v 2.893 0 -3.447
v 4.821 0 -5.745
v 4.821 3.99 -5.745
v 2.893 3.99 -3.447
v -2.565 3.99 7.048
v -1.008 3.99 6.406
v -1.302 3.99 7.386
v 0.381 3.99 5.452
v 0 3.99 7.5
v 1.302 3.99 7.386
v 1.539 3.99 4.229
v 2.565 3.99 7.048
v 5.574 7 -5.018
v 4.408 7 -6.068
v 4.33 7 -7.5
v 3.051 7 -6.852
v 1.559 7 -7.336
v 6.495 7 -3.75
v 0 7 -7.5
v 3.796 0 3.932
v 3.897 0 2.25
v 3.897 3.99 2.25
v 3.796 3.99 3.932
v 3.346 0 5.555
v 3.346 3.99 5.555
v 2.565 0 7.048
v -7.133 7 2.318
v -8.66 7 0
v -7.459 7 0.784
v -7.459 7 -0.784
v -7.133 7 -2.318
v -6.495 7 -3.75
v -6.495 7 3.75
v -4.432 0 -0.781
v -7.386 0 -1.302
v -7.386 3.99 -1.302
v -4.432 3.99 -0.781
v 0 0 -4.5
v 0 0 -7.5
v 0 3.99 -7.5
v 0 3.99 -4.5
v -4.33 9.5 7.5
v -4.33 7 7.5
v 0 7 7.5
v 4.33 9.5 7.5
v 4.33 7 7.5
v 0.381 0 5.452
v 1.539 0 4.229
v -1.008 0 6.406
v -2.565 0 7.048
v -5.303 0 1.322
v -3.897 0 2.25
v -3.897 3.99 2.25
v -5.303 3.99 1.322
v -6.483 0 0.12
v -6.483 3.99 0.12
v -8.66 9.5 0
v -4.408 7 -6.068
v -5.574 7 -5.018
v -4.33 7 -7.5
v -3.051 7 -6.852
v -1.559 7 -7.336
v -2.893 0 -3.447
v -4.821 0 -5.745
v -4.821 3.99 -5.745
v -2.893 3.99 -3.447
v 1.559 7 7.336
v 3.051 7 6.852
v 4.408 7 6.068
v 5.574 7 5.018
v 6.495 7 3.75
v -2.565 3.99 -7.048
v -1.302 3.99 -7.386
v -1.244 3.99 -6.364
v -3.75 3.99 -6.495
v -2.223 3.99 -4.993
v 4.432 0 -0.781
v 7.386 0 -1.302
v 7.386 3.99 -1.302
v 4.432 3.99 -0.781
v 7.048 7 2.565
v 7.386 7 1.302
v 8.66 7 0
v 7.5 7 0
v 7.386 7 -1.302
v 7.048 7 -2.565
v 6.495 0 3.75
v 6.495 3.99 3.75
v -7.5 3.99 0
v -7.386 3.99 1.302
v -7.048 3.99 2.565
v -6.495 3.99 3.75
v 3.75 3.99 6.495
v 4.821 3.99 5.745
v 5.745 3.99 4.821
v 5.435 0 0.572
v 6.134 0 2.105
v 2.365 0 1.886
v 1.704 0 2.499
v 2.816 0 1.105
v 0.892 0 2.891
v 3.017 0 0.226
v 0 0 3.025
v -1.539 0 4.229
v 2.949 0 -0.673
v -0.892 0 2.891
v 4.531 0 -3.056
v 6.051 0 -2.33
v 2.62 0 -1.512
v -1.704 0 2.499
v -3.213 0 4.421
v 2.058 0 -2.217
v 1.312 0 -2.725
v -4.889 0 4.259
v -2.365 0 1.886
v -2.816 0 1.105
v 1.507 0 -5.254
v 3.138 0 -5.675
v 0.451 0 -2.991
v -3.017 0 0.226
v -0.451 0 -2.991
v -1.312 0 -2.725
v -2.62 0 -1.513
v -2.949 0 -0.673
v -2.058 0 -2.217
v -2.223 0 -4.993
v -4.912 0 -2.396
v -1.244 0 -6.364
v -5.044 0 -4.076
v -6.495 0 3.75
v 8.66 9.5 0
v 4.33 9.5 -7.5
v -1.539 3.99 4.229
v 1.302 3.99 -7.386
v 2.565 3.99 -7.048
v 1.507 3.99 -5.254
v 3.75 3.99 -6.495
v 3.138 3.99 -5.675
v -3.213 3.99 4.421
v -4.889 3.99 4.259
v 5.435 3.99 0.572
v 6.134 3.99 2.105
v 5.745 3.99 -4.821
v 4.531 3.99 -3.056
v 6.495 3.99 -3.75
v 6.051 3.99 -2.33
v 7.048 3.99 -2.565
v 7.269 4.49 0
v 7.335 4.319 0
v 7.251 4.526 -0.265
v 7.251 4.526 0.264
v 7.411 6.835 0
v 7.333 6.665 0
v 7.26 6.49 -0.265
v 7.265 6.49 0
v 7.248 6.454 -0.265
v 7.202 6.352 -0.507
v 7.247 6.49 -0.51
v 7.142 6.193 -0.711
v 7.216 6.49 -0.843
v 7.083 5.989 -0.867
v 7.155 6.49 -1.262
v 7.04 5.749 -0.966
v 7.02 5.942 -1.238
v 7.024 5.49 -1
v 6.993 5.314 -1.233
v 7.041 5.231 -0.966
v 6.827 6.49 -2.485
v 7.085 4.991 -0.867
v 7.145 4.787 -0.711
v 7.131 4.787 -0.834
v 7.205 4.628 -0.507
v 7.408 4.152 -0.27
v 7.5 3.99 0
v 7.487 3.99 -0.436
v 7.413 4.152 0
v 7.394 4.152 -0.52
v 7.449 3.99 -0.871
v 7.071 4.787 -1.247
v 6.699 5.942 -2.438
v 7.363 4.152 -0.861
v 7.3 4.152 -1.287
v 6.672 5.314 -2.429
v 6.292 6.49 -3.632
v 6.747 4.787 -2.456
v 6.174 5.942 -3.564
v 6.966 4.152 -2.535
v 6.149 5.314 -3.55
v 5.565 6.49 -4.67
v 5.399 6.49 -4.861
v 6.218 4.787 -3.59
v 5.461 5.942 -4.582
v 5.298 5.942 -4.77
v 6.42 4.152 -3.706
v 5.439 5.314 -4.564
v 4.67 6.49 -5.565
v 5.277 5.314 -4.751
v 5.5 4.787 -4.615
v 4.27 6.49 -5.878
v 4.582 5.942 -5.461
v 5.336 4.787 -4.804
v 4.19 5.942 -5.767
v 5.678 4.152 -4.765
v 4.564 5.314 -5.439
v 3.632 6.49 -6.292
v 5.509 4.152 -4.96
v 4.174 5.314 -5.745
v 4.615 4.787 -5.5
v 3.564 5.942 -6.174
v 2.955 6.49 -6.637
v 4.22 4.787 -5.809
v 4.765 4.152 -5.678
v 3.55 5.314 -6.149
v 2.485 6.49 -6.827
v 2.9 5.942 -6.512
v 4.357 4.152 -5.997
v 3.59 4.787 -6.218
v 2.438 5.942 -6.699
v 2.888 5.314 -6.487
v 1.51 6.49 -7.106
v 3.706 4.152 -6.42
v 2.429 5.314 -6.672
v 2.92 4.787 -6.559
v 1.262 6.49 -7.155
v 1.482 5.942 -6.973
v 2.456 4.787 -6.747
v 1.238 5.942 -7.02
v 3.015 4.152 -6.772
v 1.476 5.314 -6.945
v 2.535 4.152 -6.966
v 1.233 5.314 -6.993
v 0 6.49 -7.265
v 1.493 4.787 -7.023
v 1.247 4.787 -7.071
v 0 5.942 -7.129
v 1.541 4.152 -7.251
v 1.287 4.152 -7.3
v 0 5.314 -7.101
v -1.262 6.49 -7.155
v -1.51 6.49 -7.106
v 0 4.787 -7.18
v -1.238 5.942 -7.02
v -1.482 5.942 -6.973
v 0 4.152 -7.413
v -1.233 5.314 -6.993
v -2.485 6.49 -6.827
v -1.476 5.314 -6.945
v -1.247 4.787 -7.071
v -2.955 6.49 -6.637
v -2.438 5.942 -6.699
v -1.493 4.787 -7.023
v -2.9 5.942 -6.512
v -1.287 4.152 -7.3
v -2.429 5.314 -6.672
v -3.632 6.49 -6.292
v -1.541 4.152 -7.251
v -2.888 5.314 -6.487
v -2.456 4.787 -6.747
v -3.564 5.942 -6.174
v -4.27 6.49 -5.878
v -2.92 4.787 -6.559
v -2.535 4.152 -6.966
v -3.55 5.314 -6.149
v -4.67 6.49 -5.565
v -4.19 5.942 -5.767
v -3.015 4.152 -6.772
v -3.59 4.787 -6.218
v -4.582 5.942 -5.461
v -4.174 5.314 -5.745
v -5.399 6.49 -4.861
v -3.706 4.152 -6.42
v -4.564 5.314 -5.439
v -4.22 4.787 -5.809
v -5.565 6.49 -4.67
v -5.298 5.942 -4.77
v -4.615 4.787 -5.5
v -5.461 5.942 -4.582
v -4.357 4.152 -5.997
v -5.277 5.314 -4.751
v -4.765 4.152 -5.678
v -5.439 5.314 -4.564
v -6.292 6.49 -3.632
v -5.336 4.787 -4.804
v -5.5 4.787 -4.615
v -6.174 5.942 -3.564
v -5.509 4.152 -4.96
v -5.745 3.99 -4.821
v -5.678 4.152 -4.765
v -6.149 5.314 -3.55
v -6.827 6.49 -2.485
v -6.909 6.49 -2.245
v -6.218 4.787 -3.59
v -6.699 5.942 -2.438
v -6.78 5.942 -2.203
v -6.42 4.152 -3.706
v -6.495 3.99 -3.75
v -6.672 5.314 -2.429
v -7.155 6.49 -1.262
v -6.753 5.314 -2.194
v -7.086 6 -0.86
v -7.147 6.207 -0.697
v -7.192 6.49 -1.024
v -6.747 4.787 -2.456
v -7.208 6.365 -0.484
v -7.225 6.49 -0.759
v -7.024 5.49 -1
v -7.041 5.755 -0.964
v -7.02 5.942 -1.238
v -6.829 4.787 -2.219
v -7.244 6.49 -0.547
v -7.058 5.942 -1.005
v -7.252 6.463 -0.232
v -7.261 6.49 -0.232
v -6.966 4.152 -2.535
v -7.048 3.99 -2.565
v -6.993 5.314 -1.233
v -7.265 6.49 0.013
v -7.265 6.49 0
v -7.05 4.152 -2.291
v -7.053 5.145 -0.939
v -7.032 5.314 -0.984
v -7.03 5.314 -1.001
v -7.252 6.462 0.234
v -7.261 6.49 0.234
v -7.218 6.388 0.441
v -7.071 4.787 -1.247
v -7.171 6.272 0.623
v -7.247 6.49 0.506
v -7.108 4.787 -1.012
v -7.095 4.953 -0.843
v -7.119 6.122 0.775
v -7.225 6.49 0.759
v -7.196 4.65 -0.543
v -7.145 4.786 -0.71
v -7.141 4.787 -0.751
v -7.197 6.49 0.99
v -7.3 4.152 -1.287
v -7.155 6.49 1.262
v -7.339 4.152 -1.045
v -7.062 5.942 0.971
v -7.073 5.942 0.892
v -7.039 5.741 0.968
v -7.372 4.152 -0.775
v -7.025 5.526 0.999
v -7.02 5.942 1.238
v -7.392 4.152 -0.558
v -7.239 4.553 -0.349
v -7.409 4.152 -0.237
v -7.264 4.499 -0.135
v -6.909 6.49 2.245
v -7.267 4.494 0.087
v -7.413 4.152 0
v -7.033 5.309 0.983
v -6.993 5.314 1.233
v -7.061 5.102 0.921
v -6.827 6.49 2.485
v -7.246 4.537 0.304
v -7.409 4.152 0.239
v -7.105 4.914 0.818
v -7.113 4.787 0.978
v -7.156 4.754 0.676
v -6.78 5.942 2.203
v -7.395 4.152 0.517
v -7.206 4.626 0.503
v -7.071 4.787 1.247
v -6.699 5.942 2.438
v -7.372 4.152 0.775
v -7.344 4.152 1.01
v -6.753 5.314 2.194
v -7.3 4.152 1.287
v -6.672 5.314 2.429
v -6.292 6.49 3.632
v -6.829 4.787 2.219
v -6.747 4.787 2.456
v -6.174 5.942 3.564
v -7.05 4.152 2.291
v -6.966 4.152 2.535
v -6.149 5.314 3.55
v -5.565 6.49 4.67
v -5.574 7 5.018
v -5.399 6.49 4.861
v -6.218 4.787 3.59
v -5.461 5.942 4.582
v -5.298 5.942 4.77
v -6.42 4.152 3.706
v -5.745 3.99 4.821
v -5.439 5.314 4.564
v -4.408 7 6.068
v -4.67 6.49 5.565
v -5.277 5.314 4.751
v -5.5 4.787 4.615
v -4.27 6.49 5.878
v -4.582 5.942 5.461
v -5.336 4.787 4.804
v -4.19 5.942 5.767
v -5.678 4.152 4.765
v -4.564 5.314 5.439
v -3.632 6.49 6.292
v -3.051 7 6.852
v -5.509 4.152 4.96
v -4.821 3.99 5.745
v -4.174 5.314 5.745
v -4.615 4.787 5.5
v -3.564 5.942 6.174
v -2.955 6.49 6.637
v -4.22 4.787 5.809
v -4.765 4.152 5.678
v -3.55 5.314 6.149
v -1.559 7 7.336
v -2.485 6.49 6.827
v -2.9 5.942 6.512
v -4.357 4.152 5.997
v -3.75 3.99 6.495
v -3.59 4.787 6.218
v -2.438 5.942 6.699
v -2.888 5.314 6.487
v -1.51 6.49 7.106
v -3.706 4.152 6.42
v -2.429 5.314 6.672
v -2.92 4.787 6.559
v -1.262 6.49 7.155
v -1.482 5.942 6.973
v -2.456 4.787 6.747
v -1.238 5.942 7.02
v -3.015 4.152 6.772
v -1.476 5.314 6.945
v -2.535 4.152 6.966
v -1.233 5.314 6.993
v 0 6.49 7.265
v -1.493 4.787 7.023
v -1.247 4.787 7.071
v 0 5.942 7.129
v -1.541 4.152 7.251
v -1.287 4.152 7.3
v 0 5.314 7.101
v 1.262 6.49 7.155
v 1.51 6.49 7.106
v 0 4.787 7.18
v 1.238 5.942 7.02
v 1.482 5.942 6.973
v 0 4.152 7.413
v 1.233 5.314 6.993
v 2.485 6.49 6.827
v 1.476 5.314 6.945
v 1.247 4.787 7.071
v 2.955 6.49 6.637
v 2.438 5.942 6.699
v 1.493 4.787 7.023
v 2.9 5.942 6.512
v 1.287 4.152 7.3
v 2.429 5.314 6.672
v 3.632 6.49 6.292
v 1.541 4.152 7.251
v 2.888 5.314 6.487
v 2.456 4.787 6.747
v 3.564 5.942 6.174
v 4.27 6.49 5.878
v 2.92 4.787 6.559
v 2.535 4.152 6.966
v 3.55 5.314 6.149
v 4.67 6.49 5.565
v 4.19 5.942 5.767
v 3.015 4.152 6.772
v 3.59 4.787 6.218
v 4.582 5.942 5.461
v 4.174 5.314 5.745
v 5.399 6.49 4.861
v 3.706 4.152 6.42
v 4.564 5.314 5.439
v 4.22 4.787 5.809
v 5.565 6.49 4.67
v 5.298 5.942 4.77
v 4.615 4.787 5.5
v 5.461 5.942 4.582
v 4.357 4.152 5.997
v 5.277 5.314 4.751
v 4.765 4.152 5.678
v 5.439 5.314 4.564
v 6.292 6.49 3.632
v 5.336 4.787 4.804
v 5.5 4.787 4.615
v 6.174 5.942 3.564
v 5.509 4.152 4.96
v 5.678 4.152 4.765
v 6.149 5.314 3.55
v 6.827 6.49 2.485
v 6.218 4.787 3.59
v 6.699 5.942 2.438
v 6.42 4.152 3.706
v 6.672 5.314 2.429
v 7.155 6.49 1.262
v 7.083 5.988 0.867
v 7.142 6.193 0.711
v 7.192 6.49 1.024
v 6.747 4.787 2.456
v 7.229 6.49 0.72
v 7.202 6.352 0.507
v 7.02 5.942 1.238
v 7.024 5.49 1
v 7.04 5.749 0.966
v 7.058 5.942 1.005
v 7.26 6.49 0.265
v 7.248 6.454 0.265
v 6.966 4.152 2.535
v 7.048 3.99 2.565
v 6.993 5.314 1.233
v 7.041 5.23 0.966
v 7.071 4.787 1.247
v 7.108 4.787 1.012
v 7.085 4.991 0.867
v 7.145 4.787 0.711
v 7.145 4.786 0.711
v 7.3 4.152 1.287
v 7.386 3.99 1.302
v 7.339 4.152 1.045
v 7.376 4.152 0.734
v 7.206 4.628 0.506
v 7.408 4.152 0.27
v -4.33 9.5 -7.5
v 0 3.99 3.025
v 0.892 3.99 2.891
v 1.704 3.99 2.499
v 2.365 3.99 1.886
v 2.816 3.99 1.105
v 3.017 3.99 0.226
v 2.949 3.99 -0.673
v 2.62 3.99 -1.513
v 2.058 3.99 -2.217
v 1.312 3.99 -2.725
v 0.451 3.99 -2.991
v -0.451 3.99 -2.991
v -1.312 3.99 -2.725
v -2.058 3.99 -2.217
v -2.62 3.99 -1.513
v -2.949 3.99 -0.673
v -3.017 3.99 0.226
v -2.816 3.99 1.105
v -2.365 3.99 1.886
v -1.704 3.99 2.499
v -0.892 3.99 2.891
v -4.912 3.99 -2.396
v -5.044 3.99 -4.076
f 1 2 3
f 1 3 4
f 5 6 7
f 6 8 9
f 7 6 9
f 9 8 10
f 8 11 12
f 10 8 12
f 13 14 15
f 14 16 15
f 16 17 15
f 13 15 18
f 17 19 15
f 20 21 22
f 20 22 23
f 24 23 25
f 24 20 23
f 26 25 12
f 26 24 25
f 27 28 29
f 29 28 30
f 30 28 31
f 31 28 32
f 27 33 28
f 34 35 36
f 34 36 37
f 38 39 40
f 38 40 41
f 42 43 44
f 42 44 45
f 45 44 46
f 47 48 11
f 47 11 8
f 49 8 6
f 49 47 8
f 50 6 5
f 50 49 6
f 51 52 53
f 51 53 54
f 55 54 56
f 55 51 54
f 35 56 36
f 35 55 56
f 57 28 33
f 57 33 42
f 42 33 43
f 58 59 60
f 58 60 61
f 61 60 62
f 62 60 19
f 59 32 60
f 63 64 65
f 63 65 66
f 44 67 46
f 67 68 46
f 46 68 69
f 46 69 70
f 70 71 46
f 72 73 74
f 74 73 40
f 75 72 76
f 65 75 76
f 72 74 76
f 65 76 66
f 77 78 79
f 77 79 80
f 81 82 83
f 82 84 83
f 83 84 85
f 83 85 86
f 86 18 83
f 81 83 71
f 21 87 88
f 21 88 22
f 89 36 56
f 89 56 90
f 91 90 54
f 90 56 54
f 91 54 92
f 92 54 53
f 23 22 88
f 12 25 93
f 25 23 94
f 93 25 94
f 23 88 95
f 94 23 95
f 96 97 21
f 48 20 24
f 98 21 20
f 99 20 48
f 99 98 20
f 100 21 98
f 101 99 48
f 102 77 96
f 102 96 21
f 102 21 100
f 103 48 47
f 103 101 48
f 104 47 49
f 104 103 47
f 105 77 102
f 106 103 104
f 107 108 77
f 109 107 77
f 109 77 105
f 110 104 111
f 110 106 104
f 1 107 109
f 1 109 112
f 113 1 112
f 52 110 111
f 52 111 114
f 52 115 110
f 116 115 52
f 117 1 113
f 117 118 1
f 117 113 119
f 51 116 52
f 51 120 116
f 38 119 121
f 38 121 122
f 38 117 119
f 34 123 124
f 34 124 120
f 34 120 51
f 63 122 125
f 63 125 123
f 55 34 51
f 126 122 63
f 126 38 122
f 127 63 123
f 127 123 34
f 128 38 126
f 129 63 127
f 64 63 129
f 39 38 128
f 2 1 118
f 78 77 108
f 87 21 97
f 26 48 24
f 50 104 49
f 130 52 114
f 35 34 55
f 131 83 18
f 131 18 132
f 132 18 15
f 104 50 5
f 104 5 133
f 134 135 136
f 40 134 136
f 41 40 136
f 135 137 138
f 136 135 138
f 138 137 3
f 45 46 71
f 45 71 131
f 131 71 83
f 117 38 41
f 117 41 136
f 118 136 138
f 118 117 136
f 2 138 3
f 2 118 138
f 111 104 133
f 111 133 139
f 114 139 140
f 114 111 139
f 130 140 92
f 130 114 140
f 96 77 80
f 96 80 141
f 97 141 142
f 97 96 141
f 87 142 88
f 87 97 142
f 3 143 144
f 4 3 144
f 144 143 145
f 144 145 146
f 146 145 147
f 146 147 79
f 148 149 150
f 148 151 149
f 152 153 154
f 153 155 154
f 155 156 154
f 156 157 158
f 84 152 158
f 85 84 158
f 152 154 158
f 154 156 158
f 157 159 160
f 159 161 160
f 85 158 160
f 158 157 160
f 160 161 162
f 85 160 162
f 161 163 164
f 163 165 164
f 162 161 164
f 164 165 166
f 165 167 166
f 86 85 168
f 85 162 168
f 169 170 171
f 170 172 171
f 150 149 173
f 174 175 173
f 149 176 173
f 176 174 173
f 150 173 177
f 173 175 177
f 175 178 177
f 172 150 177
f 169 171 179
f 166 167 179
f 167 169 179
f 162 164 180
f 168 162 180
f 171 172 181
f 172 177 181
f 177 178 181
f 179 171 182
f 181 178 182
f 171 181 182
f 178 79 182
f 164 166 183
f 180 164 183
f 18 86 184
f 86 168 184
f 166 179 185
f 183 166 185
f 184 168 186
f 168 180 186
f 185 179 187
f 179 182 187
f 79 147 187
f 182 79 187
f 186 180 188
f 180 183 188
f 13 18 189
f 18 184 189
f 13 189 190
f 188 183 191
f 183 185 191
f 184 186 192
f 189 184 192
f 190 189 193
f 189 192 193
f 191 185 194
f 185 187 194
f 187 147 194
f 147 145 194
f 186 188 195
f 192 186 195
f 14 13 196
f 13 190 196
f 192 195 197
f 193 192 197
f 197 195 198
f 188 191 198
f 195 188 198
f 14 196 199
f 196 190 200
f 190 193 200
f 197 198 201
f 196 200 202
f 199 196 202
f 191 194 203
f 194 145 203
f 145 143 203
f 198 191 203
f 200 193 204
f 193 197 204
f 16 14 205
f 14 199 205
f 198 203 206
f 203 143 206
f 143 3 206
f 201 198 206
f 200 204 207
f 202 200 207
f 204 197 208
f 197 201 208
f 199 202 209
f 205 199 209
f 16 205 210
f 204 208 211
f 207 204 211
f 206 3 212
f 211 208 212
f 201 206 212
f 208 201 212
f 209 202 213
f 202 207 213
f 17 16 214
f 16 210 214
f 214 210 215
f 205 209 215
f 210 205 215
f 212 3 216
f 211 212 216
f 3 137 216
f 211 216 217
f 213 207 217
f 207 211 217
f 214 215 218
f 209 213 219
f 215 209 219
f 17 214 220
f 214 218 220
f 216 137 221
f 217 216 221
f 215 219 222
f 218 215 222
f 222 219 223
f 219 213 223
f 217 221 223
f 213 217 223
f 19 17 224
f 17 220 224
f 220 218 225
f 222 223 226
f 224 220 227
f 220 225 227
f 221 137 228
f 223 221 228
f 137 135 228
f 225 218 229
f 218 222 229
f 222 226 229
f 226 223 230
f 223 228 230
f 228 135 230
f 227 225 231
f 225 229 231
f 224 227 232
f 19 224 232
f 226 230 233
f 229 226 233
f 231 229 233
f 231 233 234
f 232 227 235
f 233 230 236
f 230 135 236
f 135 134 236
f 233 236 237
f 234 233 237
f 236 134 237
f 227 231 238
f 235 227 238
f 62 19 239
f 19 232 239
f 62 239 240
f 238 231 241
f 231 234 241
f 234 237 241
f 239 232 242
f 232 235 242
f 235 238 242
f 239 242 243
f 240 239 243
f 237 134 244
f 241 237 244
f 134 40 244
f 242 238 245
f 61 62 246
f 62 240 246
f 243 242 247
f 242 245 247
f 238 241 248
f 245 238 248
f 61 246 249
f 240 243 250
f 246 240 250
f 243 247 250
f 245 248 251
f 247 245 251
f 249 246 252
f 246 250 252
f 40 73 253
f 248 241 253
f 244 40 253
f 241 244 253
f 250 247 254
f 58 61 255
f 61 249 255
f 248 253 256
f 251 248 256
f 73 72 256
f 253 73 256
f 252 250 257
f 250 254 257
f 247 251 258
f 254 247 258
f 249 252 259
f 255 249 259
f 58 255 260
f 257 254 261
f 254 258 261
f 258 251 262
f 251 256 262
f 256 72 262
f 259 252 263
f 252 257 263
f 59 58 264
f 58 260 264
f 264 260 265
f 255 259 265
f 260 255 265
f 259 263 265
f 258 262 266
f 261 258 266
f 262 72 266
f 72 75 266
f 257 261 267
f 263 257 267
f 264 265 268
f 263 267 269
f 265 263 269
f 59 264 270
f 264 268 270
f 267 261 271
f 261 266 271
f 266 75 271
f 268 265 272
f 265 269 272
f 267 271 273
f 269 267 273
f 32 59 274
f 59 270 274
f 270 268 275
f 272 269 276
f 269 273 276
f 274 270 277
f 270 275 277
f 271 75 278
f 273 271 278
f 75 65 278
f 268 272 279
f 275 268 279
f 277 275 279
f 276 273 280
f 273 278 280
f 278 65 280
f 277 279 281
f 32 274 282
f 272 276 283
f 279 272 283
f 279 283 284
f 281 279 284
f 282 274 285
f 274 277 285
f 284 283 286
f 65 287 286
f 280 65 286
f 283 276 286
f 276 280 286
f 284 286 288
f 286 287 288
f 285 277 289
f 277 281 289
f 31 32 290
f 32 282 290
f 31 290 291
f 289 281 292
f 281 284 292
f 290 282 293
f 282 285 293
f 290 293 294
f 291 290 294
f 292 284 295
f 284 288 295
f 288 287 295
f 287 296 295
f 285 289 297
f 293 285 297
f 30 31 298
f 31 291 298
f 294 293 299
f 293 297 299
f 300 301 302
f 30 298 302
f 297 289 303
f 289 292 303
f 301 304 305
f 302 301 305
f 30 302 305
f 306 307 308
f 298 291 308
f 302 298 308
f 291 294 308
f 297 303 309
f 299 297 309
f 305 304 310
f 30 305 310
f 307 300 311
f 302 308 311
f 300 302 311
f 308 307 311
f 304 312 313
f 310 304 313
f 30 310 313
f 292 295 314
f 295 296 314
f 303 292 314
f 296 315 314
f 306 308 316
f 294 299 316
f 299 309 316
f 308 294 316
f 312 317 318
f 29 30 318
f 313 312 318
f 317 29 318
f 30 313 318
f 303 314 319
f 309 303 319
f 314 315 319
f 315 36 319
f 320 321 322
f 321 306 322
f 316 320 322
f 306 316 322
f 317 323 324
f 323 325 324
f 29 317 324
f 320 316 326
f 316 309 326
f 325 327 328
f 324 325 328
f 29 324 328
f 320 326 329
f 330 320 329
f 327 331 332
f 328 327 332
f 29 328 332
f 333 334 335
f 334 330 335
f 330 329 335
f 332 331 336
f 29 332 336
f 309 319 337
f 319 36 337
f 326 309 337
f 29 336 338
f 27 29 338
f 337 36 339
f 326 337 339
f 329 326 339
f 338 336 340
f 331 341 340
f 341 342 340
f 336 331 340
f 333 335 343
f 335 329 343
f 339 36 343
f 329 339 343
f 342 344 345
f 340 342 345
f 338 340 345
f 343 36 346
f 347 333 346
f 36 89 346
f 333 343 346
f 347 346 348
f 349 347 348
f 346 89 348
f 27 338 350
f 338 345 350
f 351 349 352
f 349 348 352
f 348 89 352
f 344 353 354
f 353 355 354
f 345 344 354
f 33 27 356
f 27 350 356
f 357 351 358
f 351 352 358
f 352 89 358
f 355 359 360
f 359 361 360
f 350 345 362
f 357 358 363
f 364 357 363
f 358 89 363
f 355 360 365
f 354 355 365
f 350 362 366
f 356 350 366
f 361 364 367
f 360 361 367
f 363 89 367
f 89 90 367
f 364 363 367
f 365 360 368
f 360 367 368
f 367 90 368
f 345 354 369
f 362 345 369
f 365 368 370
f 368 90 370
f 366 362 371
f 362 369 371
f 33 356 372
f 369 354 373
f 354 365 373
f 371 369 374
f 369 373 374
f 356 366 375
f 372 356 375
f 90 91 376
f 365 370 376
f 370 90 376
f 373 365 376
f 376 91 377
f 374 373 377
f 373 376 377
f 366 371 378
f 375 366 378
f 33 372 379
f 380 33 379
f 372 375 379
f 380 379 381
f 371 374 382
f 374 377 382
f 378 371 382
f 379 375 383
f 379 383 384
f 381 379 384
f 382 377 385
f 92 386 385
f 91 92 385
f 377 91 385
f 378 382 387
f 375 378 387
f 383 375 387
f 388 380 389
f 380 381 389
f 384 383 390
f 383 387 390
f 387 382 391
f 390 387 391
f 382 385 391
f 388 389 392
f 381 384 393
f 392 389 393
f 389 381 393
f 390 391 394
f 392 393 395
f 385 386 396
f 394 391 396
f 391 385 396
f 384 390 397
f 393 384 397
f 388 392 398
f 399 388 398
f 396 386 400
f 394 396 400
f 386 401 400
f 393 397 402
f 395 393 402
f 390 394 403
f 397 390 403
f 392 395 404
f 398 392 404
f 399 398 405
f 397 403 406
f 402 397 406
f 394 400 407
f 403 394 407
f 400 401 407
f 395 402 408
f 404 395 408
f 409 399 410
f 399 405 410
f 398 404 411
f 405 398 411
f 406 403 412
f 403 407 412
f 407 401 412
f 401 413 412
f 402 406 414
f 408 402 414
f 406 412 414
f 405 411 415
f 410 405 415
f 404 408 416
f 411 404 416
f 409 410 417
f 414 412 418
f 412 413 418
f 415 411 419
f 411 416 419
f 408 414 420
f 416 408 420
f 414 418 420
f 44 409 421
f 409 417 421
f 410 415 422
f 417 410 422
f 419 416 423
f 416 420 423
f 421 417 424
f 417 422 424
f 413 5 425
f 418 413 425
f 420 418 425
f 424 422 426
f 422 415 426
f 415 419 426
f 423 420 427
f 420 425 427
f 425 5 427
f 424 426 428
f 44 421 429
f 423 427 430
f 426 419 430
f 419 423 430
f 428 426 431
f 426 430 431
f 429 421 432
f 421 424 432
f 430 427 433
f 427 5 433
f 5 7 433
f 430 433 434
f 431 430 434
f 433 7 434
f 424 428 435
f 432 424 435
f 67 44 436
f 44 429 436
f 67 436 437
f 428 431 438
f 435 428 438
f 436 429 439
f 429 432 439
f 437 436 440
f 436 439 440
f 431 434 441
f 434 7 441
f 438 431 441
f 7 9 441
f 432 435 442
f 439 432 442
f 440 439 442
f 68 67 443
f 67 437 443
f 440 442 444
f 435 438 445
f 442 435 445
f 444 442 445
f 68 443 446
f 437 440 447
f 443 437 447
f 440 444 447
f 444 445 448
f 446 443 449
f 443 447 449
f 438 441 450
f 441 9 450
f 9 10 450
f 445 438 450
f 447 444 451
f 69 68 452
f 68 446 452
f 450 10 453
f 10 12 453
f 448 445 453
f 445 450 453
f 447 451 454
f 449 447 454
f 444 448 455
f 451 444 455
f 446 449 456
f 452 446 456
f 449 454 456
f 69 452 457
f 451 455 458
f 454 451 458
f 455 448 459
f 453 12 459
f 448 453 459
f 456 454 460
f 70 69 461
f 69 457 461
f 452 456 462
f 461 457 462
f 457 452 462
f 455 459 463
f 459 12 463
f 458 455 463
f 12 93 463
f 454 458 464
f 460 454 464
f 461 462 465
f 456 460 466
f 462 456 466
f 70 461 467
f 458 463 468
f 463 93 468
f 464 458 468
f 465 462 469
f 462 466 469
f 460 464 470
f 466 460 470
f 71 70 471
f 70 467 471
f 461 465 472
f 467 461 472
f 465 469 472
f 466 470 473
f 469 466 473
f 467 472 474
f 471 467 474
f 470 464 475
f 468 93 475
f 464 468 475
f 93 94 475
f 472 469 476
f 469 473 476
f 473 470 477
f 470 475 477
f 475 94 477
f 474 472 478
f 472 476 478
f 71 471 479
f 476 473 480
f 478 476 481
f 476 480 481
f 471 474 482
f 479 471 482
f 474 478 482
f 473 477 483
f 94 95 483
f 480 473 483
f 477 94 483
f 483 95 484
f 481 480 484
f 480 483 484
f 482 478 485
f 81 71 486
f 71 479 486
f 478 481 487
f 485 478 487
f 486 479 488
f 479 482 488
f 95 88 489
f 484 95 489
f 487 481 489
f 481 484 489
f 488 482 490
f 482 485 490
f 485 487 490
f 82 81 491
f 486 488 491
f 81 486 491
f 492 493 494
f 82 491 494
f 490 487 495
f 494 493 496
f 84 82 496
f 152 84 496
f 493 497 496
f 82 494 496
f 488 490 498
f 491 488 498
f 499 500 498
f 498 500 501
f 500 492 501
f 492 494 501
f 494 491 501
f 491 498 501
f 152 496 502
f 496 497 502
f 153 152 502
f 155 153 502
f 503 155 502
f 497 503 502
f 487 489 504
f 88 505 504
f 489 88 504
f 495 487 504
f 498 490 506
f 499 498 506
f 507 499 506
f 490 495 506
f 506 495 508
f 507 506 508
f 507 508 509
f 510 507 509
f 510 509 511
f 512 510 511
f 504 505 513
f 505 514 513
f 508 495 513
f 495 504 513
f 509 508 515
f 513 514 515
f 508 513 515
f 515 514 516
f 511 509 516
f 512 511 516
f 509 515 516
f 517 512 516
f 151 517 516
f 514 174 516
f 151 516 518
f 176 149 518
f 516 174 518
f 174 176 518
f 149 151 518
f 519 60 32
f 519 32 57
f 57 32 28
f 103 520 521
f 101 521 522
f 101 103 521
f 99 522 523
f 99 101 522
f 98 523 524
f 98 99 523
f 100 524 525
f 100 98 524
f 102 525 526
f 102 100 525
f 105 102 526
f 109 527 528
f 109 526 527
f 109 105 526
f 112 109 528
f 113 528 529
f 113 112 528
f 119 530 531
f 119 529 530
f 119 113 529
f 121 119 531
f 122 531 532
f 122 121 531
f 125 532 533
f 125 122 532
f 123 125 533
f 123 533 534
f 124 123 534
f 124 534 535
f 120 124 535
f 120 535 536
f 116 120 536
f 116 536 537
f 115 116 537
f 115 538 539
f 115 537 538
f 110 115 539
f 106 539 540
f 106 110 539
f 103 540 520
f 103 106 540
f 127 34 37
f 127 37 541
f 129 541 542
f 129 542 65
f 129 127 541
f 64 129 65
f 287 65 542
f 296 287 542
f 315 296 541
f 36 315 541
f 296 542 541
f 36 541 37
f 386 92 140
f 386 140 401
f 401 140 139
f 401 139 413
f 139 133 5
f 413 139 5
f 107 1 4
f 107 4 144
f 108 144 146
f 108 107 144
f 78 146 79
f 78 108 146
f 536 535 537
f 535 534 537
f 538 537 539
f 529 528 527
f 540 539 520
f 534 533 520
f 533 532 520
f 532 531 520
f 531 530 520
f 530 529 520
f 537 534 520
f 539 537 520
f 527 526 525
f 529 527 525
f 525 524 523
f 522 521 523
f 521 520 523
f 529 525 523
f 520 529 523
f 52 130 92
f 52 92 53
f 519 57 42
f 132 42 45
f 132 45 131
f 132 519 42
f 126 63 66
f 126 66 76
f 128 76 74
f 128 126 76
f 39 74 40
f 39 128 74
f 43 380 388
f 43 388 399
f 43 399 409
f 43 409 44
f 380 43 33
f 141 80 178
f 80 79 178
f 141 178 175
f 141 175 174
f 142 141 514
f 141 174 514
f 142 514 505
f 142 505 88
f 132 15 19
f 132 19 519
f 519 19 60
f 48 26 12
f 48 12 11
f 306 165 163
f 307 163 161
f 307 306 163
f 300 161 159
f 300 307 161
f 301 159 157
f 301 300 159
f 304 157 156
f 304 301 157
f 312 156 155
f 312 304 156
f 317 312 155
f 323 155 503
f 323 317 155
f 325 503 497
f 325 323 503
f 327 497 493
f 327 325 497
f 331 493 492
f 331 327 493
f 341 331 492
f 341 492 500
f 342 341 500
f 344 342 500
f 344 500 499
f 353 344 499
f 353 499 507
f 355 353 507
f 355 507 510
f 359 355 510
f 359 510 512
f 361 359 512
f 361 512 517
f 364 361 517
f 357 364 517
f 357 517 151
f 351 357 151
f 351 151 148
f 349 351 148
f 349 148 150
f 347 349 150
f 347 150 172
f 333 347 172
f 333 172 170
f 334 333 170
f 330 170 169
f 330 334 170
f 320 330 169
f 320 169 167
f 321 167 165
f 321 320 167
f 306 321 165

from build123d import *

# Parameters (mm, degrees)
SKETCH1_R                = 3.025
BOSS_EXTRUDE1_DEPTH      = 4
BOSS_EXTRUDE2_DEPTH      = 3
BOSS_EXTRUDE2_DEPTH_BACK = 0.01
SKETCH2_R                = 7.5
BOSS_EXTRUDE3_DEPTH      = 2.5
CUT_EXTRUDE1_DEPTH       = 15.882876066
CUT_EXTRUDE1_DEPTH_BACK  = 15.882876066
SKETCH4_R                = 1


with BuildPart() as part:
    # Sketch1 → Boss-Extrude1 (new body)
    with BuildSketch(Plane(origin=(0, 0, 0), x_dir=(1, 0, 0), z_dir=(0, 1, 0))):
        with BuildLine():
            ThreePointArc((4.820907073, 5.745333323), (2.311100785, 5.507278856), (0, 4.5))
            Line((0, 4.5), (0, 7.5))
            ThreePointArc((0, 7.5), (-1.769604698, 5.704367313), (-2.892544244, 3.447199994))
            Line((-2.892544244, 3.447199994), (-4.820907073, 5.745333323))
            ThreePointArc((-4.820907073, 5.745333323), (-5.022292475, 3.232318908), (-4.431634889, 0.7814168))
            Line((-4.431634889, 0.7814168), (-7.386058148, 1.302361333))
            ThreePointArc((-7.386058148, 1.302361333), (-5.924993787, -0.752167437), (-3.897114317, -2.25))
            Line((-3.897114317, -2.25), (-6.495190528, -3.75))
            ThreePointArc((-6.495190528, -3.75), (-4.055324657, -4.384706279), (-1.539090645, -4.228616794))
            Line((-1.539090645, -4.228616794), (-2.565151075, -7.047694656))
            ThreePointArc((-2.565151075, -7.047694656), (-0.28812405, -5.965592323), (1.539090645, -4.228616794))
            Line((1.539090645, -4.228616794), (2.565151075, -7.047694656))
            ThreePointArc((2.565151075, -7.047694656), (3.613893002, -4.755111418), (3.897114317, -2.25))
            Line((3.897114317, -2.25), (6.495190528, -3.75))
            ThreePointArc((6.495190528, -3.75), (5.824929355, -1.319661034), (4.431634889, 0.7814168))
            Line((4.431634889, 0.7814168), (7.386058148, 1.302361333))
            ThreePointArc((7.386058148, 1.302361333), (5.310416525, 2.733273415), (2.892544244, 3.447199994))
            Line((2.892544244, 3.447199994), (4.820907073, 5.745333323))
        make_face()
        Circle(SKETCH1_R, mode=Mode.SUBTRACT)
    extrude(amount=BOSS_EXTRUDE1_DEPTH)

    # Sketch2 → Boss-Extrude2 (add, two sides: drawn at the far end of the back side and taken through both)
    with BuildSketch(Plane(origin=(0, 4, 0), x_dir=(1, 0, 0), z_dir=(0, 1, 0)).offset(-BOSS_EXTRUDE2_DEPTH_BACK)):
        Circle(SKETCH2_R)
    extrude(amount=BOSS_EXTRUDE2_DEPTH + BOSS_EXTRUDE2_DEPTH_BACK)

    # Sketch3 → Boss-Extrude3 (add)
    with BuildSketch(Plane(origin=(0, 7, 0), x_dir=(1, 0, 0), z_dir=(0, 1, 0))):
        Polygon((4.330127019, 7.5), (-4.330127019, 7.5), (-8.660254038, 0), (-4.330127019, -7.5), (4.330127019, -7.5), (8.660254038, 0), align=None)
    extrude(amount=BOSS_EXTRUDE3_DEPTH)

    # Sketch4 → Cut-Extrude1 (cut, two sides: drawn at the far end of the back side and taken through both)
    with BuildSketch(Plane(origin=(0, 0, 0), x_dir=(0, 0, -1), z_dir=(1, 0, 0)).offset(-CUT_EXTRUDE1_DEPTH_BACK)):
        with Locations((0, 5.49)):
            Circle(SKETCH4_R)
    extrude(amount=CUT_EXTRUDE1_DEPTH + CUT_EXTRUDE1_DEPTH_BACK, mode=Mode.SUBTRACT)

    # Cut-Sweep1: sweep along a path in Sketch2<2>
    with BuildLine(Plane(origin=(0, 4, 0), x_dir=(1, 0, 0), z_dir=(0, 1, 0))) as cut_sweep1_path:
        CenterArc((0, 0), 7.5, 0, 360)
    # Sketch5 → Cut-Sweep1 (sweep, cut)
    with BuildSketch(Plane(origin=(0, 0, 0), x_dir=(0, 0, -1), z_dir=(1, 0, 0))):
        with BuildLine():
            Line((7.5, 7), (7.5, 3.99))
            ThreePointArc((7.5, 3.99), (7.095183038, 5.495), (7.5, 7))
        make_face()
    sweep(path=cut_sweep1_path.line, mode=Mode.SUBTRACT)


solid = part.part
